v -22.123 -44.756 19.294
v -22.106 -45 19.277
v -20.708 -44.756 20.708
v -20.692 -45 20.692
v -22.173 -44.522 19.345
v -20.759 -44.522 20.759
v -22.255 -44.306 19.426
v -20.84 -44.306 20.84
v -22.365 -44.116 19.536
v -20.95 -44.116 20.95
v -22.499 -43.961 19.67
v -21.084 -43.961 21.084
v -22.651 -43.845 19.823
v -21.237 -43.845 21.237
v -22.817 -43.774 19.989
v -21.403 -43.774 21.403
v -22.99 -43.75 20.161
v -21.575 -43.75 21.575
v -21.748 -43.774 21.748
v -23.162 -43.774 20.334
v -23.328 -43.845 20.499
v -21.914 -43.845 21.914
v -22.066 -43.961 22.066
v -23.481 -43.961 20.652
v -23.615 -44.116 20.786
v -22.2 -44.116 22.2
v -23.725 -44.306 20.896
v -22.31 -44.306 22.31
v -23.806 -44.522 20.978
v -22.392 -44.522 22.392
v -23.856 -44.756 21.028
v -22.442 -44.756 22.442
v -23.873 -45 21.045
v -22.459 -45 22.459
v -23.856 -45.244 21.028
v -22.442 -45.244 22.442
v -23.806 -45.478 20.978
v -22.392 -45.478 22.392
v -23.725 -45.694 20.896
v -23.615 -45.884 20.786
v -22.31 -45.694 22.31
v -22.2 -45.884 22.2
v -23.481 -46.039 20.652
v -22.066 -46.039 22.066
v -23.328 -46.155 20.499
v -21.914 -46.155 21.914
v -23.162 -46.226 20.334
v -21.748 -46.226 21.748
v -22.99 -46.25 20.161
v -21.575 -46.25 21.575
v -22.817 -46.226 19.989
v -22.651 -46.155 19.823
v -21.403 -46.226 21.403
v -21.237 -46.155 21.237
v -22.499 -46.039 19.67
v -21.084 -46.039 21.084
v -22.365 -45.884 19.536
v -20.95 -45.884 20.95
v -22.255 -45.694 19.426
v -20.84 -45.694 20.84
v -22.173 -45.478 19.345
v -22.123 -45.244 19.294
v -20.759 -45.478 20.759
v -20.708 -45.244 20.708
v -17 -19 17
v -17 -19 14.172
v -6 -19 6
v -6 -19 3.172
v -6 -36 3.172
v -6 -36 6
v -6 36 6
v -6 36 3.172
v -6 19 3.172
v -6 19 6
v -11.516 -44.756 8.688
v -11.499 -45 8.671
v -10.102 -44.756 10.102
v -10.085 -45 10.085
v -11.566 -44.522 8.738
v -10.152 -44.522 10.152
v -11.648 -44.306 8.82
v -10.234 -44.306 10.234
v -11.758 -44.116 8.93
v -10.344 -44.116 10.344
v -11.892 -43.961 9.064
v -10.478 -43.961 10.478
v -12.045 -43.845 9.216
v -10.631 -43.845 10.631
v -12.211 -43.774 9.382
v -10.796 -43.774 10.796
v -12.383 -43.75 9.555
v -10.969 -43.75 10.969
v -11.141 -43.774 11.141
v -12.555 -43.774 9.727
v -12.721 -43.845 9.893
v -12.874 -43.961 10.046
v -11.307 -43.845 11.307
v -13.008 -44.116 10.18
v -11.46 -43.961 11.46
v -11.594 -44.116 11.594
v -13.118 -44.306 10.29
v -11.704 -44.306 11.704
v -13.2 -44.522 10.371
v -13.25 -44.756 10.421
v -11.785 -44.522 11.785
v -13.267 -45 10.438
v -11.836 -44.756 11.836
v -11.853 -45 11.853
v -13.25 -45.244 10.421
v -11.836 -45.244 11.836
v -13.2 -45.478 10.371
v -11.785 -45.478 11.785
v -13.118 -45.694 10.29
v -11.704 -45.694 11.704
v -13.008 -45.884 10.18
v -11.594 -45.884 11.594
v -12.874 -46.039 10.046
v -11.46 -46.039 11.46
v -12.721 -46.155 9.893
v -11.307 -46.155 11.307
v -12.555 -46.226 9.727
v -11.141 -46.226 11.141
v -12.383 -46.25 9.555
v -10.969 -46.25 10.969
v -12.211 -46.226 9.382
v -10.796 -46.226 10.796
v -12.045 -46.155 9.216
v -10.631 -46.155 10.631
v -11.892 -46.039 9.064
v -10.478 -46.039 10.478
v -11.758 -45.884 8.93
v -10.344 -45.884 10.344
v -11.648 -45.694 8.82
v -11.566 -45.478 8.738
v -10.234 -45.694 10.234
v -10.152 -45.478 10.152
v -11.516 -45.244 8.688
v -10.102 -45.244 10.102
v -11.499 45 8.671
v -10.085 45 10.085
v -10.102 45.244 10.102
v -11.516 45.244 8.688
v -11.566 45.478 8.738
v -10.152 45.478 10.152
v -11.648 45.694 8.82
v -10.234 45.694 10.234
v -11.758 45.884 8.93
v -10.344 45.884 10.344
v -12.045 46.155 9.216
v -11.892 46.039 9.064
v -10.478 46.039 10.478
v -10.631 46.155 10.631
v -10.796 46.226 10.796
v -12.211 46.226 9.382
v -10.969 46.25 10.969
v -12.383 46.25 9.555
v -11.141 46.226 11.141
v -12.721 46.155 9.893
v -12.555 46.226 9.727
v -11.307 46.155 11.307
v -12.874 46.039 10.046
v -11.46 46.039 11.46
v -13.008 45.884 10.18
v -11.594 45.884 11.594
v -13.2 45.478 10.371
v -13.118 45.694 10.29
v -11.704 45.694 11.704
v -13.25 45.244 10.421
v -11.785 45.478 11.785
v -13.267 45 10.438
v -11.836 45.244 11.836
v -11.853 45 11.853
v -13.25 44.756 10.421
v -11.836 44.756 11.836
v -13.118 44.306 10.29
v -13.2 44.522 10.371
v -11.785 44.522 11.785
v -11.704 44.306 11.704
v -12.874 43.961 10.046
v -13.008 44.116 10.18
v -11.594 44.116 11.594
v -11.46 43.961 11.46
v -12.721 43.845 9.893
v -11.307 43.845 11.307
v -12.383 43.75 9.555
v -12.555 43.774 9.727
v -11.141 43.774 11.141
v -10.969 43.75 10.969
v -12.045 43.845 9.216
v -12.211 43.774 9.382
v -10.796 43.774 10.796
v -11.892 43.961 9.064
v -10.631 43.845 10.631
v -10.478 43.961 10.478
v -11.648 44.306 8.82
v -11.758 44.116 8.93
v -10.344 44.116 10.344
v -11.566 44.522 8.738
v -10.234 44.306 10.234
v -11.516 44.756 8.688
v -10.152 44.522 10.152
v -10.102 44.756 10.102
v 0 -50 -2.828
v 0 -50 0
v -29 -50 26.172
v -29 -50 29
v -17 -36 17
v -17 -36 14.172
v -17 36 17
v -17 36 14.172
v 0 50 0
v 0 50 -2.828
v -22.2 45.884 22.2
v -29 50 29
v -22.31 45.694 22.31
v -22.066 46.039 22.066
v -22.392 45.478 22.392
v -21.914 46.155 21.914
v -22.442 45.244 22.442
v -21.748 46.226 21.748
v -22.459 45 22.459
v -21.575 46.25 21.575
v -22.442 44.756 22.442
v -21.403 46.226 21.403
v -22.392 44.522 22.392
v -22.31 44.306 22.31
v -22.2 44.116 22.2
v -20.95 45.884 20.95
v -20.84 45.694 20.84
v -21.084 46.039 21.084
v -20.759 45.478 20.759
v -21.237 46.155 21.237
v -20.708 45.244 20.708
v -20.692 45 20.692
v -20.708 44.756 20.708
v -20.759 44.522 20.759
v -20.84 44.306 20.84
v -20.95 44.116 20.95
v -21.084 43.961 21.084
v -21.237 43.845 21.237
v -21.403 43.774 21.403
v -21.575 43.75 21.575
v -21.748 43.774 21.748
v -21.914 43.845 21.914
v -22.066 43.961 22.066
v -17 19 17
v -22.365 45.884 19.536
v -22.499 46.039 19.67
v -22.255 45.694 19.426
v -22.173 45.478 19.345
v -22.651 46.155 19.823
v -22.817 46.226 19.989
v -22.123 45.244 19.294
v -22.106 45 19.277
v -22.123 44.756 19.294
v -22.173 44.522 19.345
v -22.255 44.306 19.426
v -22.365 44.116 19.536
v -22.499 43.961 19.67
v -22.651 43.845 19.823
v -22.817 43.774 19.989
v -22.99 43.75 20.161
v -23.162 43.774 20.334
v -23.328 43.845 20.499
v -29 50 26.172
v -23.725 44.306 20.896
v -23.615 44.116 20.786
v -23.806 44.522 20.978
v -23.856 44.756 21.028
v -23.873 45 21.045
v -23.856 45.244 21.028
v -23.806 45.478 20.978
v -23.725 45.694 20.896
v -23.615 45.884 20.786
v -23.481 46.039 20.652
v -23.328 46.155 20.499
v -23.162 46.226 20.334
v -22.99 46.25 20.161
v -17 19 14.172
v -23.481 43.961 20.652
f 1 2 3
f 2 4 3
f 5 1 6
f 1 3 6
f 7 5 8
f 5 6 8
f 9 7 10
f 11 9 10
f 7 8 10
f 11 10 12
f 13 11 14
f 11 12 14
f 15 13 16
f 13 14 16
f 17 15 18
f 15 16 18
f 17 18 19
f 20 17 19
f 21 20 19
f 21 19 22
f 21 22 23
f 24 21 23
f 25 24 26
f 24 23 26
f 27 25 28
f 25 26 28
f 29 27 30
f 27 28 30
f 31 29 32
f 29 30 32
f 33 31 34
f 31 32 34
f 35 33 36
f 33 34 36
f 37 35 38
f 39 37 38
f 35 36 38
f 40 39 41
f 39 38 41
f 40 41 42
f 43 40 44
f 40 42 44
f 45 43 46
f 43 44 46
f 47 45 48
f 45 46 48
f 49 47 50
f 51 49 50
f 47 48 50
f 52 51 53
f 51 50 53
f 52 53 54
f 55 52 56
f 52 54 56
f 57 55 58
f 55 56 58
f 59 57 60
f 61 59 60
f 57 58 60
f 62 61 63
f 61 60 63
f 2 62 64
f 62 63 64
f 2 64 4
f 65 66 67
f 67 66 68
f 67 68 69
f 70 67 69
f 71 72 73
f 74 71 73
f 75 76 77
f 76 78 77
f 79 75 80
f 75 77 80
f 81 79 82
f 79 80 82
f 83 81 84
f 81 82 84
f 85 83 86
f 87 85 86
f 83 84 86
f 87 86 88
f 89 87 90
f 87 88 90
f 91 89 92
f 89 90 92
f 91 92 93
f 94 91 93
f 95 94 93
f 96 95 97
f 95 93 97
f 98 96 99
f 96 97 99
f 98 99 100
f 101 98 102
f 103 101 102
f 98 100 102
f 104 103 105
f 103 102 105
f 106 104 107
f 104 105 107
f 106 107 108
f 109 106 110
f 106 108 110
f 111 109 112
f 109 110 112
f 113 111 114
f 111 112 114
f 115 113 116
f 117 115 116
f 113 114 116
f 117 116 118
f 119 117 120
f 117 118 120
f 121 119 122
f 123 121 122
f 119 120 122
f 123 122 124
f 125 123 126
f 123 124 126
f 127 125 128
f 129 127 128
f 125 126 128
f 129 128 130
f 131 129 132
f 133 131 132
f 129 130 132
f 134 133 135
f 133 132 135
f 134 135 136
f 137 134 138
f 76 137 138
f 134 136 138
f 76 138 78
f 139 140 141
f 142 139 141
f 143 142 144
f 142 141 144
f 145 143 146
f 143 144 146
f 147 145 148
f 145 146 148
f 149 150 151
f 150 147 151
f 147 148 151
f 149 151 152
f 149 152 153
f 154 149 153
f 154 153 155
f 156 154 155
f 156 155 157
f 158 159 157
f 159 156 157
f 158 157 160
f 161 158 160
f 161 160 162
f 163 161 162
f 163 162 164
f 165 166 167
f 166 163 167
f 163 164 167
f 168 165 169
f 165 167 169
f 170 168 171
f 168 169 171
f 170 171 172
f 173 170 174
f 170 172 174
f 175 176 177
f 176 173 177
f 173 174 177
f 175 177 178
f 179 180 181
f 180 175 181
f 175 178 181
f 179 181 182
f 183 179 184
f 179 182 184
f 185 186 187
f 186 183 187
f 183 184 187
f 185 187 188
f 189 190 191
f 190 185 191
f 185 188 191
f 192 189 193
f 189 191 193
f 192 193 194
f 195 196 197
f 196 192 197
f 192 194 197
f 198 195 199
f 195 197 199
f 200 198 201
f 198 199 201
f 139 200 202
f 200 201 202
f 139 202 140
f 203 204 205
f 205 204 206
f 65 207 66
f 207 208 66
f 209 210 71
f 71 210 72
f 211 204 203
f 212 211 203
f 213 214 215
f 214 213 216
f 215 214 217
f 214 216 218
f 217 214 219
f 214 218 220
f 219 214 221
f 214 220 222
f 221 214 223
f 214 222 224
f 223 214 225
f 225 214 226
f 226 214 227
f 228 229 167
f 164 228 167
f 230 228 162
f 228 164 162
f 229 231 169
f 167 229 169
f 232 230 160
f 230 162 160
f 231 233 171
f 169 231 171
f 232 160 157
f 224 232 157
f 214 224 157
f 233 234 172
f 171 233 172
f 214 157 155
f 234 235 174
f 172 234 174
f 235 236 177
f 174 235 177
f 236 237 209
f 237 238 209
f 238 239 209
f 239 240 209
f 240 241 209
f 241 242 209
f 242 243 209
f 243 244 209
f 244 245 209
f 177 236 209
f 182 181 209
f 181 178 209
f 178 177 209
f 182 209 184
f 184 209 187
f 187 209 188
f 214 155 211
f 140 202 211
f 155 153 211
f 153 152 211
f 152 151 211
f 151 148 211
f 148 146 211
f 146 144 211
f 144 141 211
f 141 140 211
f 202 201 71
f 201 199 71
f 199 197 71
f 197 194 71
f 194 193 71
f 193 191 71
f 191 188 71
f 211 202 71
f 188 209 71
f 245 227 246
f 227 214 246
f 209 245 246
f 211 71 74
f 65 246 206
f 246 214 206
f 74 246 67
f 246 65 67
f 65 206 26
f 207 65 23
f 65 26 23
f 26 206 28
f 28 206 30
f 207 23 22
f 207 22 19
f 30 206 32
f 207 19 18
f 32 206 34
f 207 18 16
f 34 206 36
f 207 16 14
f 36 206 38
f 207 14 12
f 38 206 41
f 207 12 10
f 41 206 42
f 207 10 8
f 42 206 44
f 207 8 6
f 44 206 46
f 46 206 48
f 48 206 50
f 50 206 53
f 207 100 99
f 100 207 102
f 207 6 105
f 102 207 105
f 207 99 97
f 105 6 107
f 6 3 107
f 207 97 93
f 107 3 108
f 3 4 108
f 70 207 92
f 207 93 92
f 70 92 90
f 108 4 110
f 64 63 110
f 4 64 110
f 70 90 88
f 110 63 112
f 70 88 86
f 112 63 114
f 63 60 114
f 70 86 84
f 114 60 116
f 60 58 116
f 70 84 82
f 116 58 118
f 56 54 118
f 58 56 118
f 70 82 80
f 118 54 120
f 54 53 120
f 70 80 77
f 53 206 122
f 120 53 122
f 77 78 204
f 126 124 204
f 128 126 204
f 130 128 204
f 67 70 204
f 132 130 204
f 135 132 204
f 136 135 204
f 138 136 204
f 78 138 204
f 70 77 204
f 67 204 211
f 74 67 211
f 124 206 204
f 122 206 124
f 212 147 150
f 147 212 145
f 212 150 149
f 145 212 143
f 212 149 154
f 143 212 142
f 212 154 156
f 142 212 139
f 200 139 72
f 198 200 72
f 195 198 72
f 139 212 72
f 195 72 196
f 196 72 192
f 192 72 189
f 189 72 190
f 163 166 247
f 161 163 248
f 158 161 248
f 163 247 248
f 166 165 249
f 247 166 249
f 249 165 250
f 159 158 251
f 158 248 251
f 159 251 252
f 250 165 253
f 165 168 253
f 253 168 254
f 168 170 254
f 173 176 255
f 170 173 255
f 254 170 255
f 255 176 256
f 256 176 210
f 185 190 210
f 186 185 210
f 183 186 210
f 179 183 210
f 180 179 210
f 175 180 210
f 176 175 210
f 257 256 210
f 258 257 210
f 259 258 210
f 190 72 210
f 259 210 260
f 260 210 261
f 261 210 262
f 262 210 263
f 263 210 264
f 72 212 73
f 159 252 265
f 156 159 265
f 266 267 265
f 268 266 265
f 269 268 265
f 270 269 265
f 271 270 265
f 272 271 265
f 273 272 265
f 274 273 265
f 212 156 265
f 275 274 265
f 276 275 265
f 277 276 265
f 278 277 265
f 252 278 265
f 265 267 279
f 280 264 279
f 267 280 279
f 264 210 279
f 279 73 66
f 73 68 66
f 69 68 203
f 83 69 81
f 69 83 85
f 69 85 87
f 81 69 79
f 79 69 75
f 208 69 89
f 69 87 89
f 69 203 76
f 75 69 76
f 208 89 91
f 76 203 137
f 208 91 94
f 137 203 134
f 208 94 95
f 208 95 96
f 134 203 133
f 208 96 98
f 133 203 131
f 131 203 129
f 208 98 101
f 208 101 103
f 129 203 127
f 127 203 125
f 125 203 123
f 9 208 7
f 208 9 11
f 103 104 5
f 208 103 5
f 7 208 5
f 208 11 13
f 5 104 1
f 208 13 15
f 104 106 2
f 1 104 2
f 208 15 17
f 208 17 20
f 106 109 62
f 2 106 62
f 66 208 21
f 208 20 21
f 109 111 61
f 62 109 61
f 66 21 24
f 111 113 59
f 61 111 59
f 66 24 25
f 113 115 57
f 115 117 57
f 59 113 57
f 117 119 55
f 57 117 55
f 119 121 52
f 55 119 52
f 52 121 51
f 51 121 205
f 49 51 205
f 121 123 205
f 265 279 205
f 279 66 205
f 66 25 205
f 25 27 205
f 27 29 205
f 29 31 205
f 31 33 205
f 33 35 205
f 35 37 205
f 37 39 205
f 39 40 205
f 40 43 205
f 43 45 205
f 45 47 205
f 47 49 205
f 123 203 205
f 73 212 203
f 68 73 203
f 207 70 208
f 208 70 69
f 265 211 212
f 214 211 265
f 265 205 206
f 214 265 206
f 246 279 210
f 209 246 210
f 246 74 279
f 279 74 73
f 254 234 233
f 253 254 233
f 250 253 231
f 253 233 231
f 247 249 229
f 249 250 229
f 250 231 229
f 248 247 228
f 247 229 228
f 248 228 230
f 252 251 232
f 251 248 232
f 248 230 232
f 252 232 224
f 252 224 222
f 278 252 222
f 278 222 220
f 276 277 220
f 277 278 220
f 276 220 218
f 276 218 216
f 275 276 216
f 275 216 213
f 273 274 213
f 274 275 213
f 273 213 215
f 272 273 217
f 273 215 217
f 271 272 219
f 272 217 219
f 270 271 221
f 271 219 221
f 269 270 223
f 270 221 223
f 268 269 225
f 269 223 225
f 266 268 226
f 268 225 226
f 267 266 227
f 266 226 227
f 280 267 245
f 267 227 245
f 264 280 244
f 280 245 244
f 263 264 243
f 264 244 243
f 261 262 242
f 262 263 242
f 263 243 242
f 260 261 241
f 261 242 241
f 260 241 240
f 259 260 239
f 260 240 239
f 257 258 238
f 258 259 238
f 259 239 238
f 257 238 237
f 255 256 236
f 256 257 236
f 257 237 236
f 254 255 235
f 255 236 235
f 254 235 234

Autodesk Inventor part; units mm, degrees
ref_plane "YZ Plane" through (0, 0, 0) normal (1, 0, 0) x (0, 1, 0)
ref_plane "XZ Plane" through (0, 0, 0) normal (0, 1, 0) x (-1, 0, 0)
ref_plane "XY Plane" through (0, 0, 0) normal (0, 0, 1) x (1, 0, 0)
sketch "Sketch1" plane through (0, 0, 0) normal (0, 1, 0) x (-1, 0, 0)
  line L0 (0, 0) -> (0, -2.8284)
  line L1 (0, -2.8284) -> (29, 26.1716)
  line L2 (29, 26.1716) -> (29, 29)
  line L3 (29, 29) -> (0, 0)
  dimension "d2" = 29
  dimension "d3" = 45
  dimension "d6" = 2
extrude "Extrusion1" add sketch "Sketch1" along normal mid plane 100
sketch "Sketch2" plane through (0, 0, 0) normal (0, 0, 1) x (1, 0, 0)
  line L0 (-17, 36) -> (-6, 36)
  line L1 (-6, 36) -> (-6, 19)
  line L2 (-6, 19) -> (-17, 19)
  line L3 (-17, 19) -> (-17, 36)
  line L4 (0, 50) -> (-29, 50) projected
  line L5 (0, -50) -> (0, 50) projected
  point P0 (0, 0)
  dimension "d7" = 14
  dimension "d8" = 17
  dimension "d9" = 11
  dimension "d11" = 6
extrude "Extrusion2" cut sketch "Sketch2" along normal up to next
mirror "Mirror1" about plane through (0, 0, 0) normal (0, 1, 0) of "Extrusion2"
sketch "Sketch3" plane through (0, -50, 0) normal (0.7071, 0, 0.7071) x (0.7071, 0, -0.7071)
  circle A0 centre (-30.5122, 5) radius 1.25
  circle A1 centre (-15.5122, 5) radius 1.25
  line L0 (-39.0122, 0) -> (-39.0122, 100) projected
  line L1 (-41.0122, 0) -> (-41.0122, 100) projected
  line L2 (0, 0) -> (-41.0122, 0) projected
  point P0 (0, 50)
  dimension "d15" = 5
  dimension "d16" = 2.5
  dimension "d17" = 15
  dimension "d18" = 2.5
  dimension "d19" = 5
  dimension "d20" = 10.5
extrude "Extrusion3" cut sketch "Sketch3" against normal up to next
mirror "Mirror2" about plane through (0, 0, 0) normal (0, 1, 0) of "Extrusion3"
properties part number "Front"
